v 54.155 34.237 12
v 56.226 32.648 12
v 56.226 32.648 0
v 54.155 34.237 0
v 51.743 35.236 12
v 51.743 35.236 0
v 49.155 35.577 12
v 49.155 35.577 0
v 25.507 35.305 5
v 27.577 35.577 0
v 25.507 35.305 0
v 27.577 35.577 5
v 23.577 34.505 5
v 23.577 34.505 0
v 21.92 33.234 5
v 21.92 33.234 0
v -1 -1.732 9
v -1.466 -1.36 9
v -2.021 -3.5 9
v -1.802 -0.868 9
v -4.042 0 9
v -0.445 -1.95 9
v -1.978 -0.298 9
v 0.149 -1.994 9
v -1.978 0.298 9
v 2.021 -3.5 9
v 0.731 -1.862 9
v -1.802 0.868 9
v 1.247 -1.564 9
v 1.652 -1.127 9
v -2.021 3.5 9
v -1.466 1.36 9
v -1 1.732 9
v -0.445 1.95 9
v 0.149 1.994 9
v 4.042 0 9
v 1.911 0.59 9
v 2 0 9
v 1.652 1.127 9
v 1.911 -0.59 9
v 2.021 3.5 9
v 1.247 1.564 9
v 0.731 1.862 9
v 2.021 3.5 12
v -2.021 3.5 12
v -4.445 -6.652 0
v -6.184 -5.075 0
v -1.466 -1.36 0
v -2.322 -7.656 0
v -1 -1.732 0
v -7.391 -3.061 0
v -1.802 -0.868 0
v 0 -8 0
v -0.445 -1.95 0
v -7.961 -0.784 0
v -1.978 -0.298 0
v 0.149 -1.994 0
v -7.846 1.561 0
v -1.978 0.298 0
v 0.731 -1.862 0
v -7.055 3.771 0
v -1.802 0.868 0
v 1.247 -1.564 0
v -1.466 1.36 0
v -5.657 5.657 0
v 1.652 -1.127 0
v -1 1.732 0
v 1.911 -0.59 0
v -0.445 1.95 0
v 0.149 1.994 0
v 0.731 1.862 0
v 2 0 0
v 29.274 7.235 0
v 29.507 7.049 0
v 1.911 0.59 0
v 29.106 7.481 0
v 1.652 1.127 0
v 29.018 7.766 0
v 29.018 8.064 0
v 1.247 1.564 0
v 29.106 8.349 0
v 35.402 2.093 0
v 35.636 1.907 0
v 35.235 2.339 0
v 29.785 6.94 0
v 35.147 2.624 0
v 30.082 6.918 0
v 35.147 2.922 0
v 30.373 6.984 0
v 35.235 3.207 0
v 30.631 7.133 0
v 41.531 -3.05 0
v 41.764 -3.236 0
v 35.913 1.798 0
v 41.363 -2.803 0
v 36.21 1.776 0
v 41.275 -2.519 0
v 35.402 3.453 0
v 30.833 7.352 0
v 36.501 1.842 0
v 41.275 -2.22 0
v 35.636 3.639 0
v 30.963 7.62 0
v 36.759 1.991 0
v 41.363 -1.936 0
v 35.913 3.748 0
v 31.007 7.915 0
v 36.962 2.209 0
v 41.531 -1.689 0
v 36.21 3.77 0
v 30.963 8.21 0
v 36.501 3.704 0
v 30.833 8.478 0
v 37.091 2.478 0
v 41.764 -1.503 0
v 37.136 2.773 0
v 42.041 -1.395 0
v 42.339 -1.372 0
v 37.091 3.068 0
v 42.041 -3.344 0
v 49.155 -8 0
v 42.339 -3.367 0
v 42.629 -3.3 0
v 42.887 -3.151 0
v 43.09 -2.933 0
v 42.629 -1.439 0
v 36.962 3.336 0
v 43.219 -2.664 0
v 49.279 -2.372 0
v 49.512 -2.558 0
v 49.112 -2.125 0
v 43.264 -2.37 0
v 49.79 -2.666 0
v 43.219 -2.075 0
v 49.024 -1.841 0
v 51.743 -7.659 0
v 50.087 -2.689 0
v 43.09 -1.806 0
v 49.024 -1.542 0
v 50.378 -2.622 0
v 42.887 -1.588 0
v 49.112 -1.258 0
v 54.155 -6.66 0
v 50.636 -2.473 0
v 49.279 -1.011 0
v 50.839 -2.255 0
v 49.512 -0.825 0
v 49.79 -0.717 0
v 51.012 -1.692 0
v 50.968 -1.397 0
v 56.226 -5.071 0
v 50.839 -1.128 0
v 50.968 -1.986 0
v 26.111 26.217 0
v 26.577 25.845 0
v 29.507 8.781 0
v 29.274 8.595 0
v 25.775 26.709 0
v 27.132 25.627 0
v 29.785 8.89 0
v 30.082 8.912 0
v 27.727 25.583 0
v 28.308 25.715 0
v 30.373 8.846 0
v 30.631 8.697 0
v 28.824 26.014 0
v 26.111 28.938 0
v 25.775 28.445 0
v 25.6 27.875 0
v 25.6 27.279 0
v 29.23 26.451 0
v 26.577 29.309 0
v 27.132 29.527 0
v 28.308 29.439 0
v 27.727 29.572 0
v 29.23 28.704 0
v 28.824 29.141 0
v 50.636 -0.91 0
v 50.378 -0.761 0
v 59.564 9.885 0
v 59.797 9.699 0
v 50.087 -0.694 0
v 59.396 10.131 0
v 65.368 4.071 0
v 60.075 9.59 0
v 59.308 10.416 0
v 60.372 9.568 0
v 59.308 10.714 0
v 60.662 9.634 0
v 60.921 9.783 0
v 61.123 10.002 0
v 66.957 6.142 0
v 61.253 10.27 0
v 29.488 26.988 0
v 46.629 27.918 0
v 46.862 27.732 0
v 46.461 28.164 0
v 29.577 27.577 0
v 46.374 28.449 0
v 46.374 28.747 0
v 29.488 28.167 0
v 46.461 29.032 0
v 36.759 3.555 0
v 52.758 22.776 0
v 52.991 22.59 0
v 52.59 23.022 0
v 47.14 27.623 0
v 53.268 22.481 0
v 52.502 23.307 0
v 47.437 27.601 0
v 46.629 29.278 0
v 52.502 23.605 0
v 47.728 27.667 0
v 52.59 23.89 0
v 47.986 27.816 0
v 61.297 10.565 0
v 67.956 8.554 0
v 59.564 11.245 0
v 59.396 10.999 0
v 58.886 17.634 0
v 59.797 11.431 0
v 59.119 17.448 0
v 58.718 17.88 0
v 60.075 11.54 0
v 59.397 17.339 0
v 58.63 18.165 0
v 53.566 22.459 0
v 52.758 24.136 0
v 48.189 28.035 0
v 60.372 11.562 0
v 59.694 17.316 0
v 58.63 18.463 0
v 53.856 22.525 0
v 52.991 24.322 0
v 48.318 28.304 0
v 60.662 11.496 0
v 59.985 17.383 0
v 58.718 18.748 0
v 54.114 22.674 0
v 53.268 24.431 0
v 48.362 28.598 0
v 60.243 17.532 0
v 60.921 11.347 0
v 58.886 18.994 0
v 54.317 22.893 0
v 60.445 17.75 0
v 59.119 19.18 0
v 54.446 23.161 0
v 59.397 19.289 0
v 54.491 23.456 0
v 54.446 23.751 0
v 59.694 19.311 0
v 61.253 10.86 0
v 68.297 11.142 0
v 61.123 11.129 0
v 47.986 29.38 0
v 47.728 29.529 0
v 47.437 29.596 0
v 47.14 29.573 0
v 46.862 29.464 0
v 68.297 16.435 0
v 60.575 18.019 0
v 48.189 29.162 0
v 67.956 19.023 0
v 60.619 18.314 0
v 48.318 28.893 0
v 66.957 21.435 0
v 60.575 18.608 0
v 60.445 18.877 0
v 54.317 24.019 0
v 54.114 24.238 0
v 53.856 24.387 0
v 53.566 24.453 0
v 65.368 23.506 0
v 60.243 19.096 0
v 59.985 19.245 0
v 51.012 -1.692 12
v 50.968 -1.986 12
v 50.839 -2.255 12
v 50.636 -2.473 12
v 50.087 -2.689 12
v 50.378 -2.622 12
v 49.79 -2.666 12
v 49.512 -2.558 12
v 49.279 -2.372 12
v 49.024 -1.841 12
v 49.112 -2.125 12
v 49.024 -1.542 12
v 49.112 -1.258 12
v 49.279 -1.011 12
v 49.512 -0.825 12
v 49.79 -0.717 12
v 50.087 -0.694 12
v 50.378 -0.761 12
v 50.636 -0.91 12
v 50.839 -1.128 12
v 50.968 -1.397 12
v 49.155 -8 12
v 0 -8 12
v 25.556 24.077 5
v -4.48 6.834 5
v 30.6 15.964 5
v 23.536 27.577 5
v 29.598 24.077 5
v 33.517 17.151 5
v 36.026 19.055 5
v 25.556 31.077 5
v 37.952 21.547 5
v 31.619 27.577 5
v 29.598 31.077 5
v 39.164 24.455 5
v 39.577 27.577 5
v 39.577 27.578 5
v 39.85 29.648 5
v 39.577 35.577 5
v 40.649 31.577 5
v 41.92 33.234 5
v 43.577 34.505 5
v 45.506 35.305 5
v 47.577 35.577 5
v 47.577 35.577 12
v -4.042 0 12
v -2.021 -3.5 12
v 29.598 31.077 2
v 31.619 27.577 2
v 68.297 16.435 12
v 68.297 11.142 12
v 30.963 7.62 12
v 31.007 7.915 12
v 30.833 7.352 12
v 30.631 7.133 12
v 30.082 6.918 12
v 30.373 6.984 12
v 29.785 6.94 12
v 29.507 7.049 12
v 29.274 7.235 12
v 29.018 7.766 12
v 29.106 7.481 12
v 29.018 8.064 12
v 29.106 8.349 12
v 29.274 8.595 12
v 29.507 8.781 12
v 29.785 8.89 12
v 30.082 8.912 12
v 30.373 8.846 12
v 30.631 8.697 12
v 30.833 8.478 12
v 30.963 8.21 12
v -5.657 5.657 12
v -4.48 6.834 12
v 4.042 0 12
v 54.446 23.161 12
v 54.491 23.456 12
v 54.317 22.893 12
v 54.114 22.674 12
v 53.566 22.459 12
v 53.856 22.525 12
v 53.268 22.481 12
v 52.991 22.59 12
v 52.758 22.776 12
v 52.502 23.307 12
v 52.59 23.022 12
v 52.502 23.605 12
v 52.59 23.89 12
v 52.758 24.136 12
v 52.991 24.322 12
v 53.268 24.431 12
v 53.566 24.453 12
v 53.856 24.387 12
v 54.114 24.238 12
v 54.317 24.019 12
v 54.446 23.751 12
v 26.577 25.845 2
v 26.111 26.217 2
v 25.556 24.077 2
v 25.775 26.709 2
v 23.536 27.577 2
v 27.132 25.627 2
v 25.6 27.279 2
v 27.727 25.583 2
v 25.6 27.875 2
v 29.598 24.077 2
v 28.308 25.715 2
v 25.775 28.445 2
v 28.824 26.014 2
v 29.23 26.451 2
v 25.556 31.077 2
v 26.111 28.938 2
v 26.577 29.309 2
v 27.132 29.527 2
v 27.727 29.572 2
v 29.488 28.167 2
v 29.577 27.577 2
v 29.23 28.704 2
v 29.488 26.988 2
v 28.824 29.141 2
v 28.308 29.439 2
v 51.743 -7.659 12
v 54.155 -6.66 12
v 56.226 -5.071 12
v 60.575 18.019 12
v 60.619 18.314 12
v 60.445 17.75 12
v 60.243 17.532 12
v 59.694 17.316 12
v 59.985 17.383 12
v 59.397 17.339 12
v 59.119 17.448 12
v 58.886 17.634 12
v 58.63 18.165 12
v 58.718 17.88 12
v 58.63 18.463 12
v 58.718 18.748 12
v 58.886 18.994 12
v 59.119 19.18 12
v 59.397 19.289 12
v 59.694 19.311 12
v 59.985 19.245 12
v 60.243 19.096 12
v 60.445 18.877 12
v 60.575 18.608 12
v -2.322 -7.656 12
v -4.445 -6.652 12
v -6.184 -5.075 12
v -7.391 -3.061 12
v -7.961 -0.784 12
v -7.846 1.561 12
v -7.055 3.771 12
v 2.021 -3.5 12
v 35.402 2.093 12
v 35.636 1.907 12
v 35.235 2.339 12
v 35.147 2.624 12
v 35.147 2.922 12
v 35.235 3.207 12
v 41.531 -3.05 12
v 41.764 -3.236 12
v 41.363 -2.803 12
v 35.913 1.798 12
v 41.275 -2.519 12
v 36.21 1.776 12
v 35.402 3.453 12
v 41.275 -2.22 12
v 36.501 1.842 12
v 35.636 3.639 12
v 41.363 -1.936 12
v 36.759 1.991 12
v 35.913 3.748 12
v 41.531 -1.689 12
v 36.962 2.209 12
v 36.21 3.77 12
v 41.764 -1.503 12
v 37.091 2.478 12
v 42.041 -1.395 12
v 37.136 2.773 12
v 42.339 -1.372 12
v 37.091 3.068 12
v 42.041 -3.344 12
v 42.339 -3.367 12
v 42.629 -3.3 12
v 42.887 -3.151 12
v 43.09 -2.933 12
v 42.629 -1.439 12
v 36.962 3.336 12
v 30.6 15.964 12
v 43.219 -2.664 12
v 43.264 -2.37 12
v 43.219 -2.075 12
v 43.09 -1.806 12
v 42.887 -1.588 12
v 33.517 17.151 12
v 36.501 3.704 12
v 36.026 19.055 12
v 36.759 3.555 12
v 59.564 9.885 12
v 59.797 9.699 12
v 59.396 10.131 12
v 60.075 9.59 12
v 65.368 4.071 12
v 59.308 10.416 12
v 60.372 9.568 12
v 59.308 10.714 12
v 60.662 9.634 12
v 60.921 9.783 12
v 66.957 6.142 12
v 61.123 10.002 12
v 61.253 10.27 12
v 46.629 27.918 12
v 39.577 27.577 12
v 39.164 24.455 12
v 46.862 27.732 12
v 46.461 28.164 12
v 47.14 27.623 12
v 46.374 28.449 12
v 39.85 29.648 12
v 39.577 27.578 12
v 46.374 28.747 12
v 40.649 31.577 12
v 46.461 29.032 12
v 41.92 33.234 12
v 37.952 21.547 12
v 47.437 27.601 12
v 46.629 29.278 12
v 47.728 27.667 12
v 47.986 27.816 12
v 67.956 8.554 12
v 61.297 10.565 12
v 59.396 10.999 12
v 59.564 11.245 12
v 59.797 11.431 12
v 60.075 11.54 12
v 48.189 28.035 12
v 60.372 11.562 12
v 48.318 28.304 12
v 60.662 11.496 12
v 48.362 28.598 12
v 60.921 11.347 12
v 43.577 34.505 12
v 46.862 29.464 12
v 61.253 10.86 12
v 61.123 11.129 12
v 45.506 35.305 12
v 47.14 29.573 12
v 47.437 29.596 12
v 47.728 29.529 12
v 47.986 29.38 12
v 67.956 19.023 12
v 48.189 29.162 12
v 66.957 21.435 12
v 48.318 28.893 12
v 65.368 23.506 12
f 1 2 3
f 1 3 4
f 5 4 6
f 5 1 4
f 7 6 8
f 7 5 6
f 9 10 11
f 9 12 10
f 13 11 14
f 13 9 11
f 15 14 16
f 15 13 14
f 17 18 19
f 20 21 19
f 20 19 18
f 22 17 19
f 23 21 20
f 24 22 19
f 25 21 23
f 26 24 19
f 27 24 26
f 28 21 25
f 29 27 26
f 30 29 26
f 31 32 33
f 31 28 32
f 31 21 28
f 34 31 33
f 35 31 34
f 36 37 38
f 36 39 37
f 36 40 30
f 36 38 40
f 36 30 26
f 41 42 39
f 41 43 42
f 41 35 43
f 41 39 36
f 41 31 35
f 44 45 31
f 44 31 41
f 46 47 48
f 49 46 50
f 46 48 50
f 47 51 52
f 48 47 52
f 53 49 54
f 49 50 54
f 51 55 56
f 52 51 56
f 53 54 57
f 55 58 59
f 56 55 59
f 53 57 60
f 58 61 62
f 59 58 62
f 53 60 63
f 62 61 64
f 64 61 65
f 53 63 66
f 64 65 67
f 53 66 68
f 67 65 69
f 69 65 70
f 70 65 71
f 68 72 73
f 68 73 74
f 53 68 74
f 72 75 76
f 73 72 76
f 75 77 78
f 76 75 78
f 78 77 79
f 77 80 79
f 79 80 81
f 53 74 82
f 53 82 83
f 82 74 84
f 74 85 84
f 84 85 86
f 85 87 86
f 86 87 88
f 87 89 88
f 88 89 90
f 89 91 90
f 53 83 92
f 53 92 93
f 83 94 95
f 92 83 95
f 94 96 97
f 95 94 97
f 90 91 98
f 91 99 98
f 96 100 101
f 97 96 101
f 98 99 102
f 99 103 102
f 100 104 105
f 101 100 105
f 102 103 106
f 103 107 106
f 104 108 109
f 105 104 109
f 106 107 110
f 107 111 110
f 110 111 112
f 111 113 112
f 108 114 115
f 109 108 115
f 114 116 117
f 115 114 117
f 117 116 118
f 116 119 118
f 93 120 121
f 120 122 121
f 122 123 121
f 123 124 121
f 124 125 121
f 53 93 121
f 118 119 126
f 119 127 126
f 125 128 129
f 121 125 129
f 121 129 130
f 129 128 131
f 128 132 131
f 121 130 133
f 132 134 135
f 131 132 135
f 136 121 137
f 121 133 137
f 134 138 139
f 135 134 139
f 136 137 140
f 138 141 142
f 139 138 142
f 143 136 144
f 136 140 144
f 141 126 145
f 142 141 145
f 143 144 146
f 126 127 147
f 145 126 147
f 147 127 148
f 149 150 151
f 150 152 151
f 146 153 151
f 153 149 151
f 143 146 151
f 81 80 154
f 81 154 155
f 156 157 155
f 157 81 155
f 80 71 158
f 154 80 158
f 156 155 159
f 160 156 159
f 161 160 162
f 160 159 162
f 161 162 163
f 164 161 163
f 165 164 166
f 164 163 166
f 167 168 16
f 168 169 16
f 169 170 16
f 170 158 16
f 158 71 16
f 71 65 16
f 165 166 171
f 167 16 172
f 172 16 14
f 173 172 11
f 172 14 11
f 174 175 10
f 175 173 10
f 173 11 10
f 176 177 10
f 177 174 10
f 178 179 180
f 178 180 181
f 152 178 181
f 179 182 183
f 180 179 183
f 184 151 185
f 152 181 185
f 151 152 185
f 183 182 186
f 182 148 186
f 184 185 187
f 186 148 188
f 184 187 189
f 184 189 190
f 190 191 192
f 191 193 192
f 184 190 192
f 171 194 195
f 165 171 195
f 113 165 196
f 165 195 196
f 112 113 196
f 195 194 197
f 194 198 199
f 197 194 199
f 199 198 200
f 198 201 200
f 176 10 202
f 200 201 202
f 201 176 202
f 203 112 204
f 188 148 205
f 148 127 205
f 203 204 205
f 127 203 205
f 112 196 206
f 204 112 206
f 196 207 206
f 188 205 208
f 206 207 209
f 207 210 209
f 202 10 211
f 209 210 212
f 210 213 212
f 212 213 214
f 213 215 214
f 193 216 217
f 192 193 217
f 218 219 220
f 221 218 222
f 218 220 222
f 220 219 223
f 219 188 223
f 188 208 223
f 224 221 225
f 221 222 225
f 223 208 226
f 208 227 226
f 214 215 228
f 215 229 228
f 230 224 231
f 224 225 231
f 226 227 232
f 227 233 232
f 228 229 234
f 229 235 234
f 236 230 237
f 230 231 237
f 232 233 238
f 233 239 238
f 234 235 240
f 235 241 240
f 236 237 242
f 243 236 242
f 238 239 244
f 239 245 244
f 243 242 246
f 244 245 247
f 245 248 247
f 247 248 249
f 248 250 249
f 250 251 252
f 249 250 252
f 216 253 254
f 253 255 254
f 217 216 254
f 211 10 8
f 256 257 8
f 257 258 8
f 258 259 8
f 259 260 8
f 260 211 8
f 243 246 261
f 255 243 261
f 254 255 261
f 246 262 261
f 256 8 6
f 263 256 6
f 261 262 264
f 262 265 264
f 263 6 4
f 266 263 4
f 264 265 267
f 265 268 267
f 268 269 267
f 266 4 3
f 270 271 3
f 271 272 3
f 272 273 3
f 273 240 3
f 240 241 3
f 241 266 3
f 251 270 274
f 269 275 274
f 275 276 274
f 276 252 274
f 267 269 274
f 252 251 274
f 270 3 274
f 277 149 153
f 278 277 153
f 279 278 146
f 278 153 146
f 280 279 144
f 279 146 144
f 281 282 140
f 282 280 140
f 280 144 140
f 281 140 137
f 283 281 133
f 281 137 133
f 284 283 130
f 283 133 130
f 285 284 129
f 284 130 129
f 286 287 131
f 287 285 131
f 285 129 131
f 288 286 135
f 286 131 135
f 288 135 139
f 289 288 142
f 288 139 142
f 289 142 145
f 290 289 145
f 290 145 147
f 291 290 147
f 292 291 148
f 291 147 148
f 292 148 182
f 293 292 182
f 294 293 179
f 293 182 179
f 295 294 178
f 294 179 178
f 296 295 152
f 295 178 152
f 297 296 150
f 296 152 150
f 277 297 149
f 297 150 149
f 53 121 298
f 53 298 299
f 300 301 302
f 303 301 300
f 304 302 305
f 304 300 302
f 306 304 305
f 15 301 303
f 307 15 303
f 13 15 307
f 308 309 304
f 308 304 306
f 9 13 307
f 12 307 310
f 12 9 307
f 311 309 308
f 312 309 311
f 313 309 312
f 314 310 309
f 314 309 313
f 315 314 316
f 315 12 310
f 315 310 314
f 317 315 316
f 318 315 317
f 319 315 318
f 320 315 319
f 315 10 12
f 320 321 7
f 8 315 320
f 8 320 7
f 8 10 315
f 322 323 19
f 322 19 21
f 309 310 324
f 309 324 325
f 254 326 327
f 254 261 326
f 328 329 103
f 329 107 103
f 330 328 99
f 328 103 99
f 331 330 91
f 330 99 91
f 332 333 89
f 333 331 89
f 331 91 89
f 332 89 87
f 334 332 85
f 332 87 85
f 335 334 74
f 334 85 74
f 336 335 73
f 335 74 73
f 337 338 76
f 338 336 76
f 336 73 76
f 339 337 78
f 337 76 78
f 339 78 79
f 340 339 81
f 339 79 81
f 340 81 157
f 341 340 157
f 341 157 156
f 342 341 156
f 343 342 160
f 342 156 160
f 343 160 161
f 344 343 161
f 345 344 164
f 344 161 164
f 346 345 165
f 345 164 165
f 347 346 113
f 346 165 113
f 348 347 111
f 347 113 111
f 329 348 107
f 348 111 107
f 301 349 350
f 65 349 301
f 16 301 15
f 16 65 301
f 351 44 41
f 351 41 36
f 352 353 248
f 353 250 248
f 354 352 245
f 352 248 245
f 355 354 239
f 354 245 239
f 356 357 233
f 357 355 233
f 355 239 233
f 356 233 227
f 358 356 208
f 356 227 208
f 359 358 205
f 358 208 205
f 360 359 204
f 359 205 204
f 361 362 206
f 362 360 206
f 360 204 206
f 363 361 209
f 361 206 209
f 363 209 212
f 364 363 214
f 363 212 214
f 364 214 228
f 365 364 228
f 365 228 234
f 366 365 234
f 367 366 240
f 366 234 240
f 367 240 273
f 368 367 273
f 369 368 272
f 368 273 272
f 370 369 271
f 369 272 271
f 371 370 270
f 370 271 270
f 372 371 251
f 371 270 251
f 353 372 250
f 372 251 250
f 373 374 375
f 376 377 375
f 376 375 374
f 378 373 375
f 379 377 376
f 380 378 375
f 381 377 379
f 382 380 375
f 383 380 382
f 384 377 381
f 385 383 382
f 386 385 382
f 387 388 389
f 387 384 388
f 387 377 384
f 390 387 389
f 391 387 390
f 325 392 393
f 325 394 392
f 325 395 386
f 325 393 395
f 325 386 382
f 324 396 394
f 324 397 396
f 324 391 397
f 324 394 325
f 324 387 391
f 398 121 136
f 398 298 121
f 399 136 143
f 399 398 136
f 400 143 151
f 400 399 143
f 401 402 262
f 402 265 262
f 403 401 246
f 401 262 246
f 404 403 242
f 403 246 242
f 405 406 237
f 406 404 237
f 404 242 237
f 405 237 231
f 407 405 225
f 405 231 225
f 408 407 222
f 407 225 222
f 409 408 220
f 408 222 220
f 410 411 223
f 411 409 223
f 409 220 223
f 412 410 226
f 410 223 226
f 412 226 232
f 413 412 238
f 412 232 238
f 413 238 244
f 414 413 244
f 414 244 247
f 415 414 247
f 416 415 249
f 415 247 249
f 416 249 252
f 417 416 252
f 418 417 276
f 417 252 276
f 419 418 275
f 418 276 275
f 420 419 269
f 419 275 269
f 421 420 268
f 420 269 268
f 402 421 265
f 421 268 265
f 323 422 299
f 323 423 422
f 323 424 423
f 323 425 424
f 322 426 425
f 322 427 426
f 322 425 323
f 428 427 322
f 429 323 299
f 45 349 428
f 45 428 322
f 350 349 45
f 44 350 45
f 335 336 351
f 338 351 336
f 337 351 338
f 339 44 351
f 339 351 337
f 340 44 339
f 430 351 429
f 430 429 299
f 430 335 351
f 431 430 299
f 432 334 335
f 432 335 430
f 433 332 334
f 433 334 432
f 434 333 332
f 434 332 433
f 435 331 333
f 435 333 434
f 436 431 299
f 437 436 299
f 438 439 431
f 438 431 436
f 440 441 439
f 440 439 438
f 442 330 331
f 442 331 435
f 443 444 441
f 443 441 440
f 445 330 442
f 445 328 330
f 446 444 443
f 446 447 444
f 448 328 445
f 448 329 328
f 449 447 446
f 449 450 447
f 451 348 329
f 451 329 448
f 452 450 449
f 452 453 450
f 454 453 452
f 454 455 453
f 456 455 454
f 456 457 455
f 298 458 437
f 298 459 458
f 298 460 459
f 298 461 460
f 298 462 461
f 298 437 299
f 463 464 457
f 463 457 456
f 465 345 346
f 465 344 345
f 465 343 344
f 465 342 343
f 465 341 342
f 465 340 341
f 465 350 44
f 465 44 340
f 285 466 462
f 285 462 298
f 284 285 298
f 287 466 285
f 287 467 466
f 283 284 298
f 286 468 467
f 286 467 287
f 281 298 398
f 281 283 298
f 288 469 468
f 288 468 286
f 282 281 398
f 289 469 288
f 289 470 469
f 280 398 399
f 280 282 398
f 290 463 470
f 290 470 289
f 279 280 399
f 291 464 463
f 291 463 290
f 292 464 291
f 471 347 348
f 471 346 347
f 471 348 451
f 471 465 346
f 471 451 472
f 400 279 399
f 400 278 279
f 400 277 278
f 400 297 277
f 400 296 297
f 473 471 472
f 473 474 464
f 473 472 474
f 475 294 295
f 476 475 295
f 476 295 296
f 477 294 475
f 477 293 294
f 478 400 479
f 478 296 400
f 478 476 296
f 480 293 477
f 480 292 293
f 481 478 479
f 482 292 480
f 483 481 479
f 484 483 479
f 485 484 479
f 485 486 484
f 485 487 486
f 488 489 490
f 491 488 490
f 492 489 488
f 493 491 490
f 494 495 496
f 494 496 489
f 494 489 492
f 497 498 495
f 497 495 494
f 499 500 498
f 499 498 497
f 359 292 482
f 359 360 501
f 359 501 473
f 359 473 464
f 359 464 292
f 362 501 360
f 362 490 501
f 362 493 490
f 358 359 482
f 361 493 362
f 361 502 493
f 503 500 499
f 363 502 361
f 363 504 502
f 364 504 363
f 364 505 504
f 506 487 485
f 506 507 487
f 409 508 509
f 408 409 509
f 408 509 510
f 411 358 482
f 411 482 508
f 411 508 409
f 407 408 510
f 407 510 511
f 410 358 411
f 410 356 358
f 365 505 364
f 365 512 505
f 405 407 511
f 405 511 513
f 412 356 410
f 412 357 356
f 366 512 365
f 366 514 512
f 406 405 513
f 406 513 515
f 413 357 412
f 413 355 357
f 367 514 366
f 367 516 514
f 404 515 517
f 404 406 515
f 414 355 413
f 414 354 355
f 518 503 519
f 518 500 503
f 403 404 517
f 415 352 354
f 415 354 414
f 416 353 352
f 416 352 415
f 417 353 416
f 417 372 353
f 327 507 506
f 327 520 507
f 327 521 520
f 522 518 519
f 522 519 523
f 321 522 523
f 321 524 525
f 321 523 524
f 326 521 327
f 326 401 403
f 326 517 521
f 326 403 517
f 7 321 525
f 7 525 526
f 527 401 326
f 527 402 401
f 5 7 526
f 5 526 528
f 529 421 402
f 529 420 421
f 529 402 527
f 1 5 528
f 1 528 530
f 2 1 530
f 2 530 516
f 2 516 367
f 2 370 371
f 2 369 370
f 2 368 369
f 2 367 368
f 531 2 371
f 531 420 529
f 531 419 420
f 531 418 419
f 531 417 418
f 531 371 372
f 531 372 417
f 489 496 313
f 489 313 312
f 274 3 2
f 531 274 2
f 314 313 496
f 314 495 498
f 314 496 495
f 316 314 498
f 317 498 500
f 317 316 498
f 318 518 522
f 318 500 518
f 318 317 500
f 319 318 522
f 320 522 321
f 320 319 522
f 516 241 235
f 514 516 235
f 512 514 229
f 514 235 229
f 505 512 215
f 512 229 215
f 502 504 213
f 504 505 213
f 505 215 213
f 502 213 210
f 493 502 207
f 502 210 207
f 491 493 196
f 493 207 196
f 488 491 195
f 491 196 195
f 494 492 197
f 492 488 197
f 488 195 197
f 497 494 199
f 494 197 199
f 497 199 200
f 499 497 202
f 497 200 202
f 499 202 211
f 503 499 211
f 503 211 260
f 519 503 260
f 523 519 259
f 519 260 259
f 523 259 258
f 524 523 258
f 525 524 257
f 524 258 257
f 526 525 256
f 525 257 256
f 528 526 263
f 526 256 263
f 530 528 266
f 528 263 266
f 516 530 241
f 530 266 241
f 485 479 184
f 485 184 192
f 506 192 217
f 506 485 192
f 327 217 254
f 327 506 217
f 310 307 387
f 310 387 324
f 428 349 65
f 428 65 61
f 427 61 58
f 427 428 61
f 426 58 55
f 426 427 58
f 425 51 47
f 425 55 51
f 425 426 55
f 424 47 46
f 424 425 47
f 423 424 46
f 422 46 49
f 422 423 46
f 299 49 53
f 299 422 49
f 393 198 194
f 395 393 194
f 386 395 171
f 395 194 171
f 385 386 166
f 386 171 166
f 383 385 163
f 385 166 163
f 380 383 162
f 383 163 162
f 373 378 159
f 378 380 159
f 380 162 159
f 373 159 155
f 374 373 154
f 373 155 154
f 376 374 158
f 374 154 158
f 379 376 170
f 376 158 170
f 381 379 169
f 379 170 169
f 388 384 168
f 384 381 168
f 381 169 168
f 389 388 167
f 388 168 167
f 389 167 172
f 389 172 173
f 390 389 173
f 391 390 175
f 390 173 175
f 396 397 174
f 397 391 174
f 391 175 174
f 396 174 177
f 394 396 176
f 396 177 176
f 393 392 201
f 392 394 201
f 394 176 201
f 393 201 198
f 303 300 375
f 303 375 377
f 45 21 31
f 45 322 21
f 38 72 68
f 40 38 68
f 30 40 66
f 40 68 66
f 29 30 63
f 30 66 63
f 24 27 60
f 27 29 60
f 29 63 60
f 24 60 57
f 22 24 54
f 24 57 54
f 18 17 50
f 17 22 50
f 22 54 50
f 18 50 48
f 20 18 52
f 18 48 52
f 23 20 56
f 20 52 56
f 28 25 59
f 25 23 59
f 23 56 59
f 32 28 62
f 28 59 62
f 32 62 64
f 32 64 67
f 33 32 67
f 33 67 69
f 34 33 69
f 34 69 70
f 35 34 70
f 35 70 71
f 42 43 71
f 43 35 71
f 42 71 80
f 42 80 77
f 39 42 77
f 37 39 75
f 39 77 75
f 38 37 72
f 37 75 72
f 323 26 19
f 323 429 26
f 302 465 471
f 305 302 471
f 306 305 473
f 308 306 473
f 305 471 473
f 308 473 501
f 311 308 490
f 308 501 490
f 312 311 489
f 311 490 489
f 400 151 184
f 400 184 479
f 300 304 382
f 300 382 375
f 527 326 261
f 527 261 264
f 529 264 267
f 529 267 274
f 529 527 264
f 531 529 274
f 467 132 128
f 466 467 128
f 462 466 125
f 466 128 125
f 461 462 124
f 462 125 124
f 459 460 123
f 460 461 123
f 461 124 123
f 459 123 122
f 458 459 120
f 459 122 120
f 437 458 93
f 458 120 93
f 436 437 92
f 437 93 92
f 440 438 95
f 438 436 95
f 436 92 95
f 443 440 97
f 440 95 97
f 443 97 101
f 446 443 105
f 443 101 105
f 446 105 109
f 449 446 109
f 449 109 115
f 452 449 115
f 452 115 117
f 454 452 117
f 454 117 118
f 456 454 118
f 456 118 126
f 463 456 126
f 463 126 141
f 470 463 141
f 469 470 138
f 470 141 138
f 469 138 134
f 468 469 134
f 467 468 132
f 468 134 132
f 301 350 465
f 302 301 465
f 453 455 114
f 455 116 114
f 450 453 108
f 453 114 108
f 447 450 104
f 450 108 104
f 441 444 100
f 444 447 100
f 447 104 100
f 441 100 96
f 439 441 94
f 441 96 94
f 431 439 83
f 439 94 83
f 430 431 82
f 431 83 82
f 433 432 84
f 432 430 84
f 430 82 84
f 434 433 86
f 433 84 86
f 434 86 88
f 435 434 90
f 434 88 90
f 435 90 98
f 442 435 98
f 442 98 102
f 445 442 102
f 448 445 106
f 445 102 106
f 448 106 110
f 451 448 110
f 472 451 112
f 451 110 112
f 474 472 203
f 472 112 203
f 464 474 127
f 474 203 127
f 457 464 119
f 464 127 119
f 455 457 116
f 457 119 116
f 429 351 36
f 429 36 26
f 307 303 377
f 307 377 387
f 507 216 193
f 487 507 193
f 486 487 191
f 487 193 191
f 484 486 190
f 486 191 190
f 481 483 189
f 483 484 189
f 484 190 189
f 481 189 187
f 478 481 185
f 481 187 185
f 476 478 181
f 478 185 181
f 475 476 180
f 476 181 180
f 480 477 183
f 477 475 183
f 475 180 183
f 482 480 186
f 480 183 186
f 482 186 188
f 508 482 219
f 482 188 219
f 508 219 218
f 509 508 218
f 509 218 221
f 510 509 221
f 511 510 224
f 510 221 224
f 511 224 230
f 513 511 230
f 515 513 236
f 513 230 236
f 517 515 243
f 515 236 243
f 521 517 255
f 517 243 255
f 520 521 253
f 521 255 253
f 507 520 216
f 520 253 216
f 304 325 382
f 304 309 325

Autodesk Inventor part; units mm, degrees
ref_plane "YZ Plane" through (0, 0, 0) normal (1, 0, 0) x (0, 1, 0)
ref_plane "XZ Plane" through (0, 0, 0) normal (0, 1, 0) x (-1, 0, 0)
ref_plane "XY Plane" through (0, 0, 0) normal (0, 0, 1) x (1, 0, 0)
sketch "Esquisse1" plane through (0, 0, 0) normal (0, 0, 1) x (1, 0, 0)
  line L0 (0, 0) -> (52, 0) construction
  line L1 (0, 0) -> (27.5772, 27.5772) construction
  circle A0 centre (27.5772, 27.5772) radius 2
  circle A1 centre (0, 0) radius 2
  line L2 (0, 0) -> (0, -8) construction
  line L3 (0, 0) -> (-5.6569, 5.6569) construction
  line L4 (68.2971, -8) -> (-19.3137, -8)
  line L5 (27.5772, 27.5772) -> (27.5772, 35.5772) construction
  line L6 (-19.3137, -8) -> (24.2635, 35.5772)
  line L7 (24.2635, 35.5772) -> (68.2971, 35.5772)
  line L8 (27.5772, 27.5772) -> (49, 27.5772) construction
  line L9 (27.5772, 27.5772) -> (55.1548, 4.4368) construction
  line L10 (27.5772, 27.5772) -> (36.2548, 37.9188) construction
  line L11 (36.2548, 37.9188) -> (41.2341, 33.7406) construction
  line L12 (41.2341, 33.7406) -> (47.3624, 28.5983) construction
  line L13 (47.3624, 28.5983) -> (53.4908, 23.456) construction
  line L14 (53.4908, 23.456) -> (59.6192, 18.3137) construction
  line L15 (55.1548, 4.4368) -> (60.2971, 10.5652) construction
  circle A2 centre (41.2341, 33.7406) radius 1 construction
  circle A3 centre (47.3624, 28.5983) radius 1
  circle A4 centre (53.4908, 23.456) radius 1
  circle A5 centre (59.6192, 18.3137) radius 1
  circle A6 centre (60.2971, 10.5652) radius 1
  circle A7 centre (23.8788, 13.0574) radius 1 construction
  circle A8 centre (30.0072, 7.9151) radius 1
  circle A9 centre (36.1355, 2.7728) radius 1
  circle A10 centre (42.2639, -2.3695) radius 1
  circle A11 centre (50.0125, -1.6915) radius 1
  line L16 (60.2971, 10.5652) -> (68.2971, 10.5652) construction
  line L17 (68.2971, 35.5772) -> (68.2971, -8)
  dimension "d39" = 39
  dimension "d41" = 4
  dimension "d44" = 8
  dimension "d64" = 8
  dimension "d80" = 45
  dimension "d82" = 8
  dimension "d101" = 36
  dimension "d102" = 40
  dimension "d103" = 13.5
  dimension "d104" = 6.5
  dimension "d105" = 8
  dimension "d106" = 8
  dimension "d107" = 8
  dimension "d108" = 8
  dimension "d109" = 2
  dimension "d110" = 8
extrude "Extrusion15" add sketch "Esquisse1" along normal blind 12
sketch "Esquisse13" plane through (0, 0, 12) normal (0, 0, 1) x (1, 0, 0)
  circle A0 centre (0, 0) radius 2 projected
  circle A1 centre (27.5772, 27.5772) radius 2 projected
  line L0 (68.2971, -8) -> (68.2971, 35.5772) projected
  line L1 (68.2971, 35.5772) -> (24.2635, 35.5772) projected
  line L2 (24.2635, 35.5772) -> (-19.3137, -8) projected
  circle A2 centre (27.5772, 27.5772) radius 12 construction
  line L3 (39.5772, 35.5772) -> (39.5772, 27.5772)
  line L4 (0, 0) -> (0, 8) construction
  line L5 (-4.4796, 6.8341) -> (30.5997, 15.964)
  arc A3 (30.5997, 15.964) -> (39.5772, 27.5772) centre (27.5772, 27.5772) ccw
  dimension "d128" = 24
  dimension "d129" = 8
extrude "Extrusion16" cut sketch "Esquisse13" against normal blind 7 contours L3 A3 L5 L2 L1
sketch "Esquisse14" plane through (0, 0, 12) normal (0, 0, 1) x (1, 0, 0)
  line L0 (-19.3137, -8) -> (68.2971, -8) projected
  circle A0 centre (0, 0) radius 2 projected
  line L1 (4.0415, 0) -> (2.0207, -3.5)
  line L2 (2.0207, -3.5) -> (-2.0207, -3.5)
  line L3 (-2.0207, -3.5) -> (-4.0415, 0)
  line L4 (-4.0415, 0) -> (-2.0207, 3.5)
  line L5 (-2.0207, 3.5) -> (2.0207, 3.5)
  line L6 (2.0207, 3.5) -> (4.0415, 0)
  line L7 (2.0207, 3.5) -> (2.0207, -3.5) construction
  dimension "d132" = 7
sketch "Esquisse15" plane through (0, 0, 5) normal (0, 0, 1) x (1, 0, 0)
  circle A0 centre (27.5772, 27.5772) radius 2 projected
  arc A1 (30.5997, 15.964) -> (39.5772, 27.5772) centre (27.5772, 27.5772) ccw projected
  line L0 (31.6186, 27.5772) -> (29.5979, 24.0772)
  line L1 (29.5979, 24.0772) -> (25.5564, 24.0772)
  line L2 (25.5564, 24.0772) -> (23.5357, 27.5772)
  line L3 (23.5357, 27.5772) -> (25.5564, 31.0772)
  line L4 (25.5564, 31.0772) -> (29.5979, 31.0772)
  line L5 (29.5979, 31.0772) -> (31.6186, 27.5772)
  line L6 (-19.3137, -8) -> (68.2971, -8) projected
  line L7 (-2.0207, 3.5) -> (2.0207, 3.5) projected
  point P0 (0, 0)
extrude "Extrusion17" cut sketch "Esquisse14" against normal blind 3
extrude "Extrusion18" cut sketch "Esquisse15" against normal blind 3
fillet "Congé8" radius 8 1 edges at (-19.3137, -8, 6)
fillet "Congé9" radius 8 1 edges at (24.2635, 35.5772, 2.5)
fillet "Congé10" radius 8 1 edges at (39.5772, 35.5772, 8.5)
chamfer "Chanfrein1" distance 15 angle 45 1 edges at (68.2971, 35.5772, 6)
chamfer "Chanfrein2" distance 15 angle 45 1 edges at (68.2971, -8, 6)
fillet "Congé12" radius 10 1 edges at (53.2971, -8, 6)
fillet "Congé13" radius 10 1 edges at (68.2971, 7, 6)
fillet "Congé14" radius 10 1 edges at (68.2971, 20.5772, 6)
fillet "Congé15" radius 10 1 edges at (53.2971, 35.5772, 6)
properties part number "joint1+ax12imprint+v2"
